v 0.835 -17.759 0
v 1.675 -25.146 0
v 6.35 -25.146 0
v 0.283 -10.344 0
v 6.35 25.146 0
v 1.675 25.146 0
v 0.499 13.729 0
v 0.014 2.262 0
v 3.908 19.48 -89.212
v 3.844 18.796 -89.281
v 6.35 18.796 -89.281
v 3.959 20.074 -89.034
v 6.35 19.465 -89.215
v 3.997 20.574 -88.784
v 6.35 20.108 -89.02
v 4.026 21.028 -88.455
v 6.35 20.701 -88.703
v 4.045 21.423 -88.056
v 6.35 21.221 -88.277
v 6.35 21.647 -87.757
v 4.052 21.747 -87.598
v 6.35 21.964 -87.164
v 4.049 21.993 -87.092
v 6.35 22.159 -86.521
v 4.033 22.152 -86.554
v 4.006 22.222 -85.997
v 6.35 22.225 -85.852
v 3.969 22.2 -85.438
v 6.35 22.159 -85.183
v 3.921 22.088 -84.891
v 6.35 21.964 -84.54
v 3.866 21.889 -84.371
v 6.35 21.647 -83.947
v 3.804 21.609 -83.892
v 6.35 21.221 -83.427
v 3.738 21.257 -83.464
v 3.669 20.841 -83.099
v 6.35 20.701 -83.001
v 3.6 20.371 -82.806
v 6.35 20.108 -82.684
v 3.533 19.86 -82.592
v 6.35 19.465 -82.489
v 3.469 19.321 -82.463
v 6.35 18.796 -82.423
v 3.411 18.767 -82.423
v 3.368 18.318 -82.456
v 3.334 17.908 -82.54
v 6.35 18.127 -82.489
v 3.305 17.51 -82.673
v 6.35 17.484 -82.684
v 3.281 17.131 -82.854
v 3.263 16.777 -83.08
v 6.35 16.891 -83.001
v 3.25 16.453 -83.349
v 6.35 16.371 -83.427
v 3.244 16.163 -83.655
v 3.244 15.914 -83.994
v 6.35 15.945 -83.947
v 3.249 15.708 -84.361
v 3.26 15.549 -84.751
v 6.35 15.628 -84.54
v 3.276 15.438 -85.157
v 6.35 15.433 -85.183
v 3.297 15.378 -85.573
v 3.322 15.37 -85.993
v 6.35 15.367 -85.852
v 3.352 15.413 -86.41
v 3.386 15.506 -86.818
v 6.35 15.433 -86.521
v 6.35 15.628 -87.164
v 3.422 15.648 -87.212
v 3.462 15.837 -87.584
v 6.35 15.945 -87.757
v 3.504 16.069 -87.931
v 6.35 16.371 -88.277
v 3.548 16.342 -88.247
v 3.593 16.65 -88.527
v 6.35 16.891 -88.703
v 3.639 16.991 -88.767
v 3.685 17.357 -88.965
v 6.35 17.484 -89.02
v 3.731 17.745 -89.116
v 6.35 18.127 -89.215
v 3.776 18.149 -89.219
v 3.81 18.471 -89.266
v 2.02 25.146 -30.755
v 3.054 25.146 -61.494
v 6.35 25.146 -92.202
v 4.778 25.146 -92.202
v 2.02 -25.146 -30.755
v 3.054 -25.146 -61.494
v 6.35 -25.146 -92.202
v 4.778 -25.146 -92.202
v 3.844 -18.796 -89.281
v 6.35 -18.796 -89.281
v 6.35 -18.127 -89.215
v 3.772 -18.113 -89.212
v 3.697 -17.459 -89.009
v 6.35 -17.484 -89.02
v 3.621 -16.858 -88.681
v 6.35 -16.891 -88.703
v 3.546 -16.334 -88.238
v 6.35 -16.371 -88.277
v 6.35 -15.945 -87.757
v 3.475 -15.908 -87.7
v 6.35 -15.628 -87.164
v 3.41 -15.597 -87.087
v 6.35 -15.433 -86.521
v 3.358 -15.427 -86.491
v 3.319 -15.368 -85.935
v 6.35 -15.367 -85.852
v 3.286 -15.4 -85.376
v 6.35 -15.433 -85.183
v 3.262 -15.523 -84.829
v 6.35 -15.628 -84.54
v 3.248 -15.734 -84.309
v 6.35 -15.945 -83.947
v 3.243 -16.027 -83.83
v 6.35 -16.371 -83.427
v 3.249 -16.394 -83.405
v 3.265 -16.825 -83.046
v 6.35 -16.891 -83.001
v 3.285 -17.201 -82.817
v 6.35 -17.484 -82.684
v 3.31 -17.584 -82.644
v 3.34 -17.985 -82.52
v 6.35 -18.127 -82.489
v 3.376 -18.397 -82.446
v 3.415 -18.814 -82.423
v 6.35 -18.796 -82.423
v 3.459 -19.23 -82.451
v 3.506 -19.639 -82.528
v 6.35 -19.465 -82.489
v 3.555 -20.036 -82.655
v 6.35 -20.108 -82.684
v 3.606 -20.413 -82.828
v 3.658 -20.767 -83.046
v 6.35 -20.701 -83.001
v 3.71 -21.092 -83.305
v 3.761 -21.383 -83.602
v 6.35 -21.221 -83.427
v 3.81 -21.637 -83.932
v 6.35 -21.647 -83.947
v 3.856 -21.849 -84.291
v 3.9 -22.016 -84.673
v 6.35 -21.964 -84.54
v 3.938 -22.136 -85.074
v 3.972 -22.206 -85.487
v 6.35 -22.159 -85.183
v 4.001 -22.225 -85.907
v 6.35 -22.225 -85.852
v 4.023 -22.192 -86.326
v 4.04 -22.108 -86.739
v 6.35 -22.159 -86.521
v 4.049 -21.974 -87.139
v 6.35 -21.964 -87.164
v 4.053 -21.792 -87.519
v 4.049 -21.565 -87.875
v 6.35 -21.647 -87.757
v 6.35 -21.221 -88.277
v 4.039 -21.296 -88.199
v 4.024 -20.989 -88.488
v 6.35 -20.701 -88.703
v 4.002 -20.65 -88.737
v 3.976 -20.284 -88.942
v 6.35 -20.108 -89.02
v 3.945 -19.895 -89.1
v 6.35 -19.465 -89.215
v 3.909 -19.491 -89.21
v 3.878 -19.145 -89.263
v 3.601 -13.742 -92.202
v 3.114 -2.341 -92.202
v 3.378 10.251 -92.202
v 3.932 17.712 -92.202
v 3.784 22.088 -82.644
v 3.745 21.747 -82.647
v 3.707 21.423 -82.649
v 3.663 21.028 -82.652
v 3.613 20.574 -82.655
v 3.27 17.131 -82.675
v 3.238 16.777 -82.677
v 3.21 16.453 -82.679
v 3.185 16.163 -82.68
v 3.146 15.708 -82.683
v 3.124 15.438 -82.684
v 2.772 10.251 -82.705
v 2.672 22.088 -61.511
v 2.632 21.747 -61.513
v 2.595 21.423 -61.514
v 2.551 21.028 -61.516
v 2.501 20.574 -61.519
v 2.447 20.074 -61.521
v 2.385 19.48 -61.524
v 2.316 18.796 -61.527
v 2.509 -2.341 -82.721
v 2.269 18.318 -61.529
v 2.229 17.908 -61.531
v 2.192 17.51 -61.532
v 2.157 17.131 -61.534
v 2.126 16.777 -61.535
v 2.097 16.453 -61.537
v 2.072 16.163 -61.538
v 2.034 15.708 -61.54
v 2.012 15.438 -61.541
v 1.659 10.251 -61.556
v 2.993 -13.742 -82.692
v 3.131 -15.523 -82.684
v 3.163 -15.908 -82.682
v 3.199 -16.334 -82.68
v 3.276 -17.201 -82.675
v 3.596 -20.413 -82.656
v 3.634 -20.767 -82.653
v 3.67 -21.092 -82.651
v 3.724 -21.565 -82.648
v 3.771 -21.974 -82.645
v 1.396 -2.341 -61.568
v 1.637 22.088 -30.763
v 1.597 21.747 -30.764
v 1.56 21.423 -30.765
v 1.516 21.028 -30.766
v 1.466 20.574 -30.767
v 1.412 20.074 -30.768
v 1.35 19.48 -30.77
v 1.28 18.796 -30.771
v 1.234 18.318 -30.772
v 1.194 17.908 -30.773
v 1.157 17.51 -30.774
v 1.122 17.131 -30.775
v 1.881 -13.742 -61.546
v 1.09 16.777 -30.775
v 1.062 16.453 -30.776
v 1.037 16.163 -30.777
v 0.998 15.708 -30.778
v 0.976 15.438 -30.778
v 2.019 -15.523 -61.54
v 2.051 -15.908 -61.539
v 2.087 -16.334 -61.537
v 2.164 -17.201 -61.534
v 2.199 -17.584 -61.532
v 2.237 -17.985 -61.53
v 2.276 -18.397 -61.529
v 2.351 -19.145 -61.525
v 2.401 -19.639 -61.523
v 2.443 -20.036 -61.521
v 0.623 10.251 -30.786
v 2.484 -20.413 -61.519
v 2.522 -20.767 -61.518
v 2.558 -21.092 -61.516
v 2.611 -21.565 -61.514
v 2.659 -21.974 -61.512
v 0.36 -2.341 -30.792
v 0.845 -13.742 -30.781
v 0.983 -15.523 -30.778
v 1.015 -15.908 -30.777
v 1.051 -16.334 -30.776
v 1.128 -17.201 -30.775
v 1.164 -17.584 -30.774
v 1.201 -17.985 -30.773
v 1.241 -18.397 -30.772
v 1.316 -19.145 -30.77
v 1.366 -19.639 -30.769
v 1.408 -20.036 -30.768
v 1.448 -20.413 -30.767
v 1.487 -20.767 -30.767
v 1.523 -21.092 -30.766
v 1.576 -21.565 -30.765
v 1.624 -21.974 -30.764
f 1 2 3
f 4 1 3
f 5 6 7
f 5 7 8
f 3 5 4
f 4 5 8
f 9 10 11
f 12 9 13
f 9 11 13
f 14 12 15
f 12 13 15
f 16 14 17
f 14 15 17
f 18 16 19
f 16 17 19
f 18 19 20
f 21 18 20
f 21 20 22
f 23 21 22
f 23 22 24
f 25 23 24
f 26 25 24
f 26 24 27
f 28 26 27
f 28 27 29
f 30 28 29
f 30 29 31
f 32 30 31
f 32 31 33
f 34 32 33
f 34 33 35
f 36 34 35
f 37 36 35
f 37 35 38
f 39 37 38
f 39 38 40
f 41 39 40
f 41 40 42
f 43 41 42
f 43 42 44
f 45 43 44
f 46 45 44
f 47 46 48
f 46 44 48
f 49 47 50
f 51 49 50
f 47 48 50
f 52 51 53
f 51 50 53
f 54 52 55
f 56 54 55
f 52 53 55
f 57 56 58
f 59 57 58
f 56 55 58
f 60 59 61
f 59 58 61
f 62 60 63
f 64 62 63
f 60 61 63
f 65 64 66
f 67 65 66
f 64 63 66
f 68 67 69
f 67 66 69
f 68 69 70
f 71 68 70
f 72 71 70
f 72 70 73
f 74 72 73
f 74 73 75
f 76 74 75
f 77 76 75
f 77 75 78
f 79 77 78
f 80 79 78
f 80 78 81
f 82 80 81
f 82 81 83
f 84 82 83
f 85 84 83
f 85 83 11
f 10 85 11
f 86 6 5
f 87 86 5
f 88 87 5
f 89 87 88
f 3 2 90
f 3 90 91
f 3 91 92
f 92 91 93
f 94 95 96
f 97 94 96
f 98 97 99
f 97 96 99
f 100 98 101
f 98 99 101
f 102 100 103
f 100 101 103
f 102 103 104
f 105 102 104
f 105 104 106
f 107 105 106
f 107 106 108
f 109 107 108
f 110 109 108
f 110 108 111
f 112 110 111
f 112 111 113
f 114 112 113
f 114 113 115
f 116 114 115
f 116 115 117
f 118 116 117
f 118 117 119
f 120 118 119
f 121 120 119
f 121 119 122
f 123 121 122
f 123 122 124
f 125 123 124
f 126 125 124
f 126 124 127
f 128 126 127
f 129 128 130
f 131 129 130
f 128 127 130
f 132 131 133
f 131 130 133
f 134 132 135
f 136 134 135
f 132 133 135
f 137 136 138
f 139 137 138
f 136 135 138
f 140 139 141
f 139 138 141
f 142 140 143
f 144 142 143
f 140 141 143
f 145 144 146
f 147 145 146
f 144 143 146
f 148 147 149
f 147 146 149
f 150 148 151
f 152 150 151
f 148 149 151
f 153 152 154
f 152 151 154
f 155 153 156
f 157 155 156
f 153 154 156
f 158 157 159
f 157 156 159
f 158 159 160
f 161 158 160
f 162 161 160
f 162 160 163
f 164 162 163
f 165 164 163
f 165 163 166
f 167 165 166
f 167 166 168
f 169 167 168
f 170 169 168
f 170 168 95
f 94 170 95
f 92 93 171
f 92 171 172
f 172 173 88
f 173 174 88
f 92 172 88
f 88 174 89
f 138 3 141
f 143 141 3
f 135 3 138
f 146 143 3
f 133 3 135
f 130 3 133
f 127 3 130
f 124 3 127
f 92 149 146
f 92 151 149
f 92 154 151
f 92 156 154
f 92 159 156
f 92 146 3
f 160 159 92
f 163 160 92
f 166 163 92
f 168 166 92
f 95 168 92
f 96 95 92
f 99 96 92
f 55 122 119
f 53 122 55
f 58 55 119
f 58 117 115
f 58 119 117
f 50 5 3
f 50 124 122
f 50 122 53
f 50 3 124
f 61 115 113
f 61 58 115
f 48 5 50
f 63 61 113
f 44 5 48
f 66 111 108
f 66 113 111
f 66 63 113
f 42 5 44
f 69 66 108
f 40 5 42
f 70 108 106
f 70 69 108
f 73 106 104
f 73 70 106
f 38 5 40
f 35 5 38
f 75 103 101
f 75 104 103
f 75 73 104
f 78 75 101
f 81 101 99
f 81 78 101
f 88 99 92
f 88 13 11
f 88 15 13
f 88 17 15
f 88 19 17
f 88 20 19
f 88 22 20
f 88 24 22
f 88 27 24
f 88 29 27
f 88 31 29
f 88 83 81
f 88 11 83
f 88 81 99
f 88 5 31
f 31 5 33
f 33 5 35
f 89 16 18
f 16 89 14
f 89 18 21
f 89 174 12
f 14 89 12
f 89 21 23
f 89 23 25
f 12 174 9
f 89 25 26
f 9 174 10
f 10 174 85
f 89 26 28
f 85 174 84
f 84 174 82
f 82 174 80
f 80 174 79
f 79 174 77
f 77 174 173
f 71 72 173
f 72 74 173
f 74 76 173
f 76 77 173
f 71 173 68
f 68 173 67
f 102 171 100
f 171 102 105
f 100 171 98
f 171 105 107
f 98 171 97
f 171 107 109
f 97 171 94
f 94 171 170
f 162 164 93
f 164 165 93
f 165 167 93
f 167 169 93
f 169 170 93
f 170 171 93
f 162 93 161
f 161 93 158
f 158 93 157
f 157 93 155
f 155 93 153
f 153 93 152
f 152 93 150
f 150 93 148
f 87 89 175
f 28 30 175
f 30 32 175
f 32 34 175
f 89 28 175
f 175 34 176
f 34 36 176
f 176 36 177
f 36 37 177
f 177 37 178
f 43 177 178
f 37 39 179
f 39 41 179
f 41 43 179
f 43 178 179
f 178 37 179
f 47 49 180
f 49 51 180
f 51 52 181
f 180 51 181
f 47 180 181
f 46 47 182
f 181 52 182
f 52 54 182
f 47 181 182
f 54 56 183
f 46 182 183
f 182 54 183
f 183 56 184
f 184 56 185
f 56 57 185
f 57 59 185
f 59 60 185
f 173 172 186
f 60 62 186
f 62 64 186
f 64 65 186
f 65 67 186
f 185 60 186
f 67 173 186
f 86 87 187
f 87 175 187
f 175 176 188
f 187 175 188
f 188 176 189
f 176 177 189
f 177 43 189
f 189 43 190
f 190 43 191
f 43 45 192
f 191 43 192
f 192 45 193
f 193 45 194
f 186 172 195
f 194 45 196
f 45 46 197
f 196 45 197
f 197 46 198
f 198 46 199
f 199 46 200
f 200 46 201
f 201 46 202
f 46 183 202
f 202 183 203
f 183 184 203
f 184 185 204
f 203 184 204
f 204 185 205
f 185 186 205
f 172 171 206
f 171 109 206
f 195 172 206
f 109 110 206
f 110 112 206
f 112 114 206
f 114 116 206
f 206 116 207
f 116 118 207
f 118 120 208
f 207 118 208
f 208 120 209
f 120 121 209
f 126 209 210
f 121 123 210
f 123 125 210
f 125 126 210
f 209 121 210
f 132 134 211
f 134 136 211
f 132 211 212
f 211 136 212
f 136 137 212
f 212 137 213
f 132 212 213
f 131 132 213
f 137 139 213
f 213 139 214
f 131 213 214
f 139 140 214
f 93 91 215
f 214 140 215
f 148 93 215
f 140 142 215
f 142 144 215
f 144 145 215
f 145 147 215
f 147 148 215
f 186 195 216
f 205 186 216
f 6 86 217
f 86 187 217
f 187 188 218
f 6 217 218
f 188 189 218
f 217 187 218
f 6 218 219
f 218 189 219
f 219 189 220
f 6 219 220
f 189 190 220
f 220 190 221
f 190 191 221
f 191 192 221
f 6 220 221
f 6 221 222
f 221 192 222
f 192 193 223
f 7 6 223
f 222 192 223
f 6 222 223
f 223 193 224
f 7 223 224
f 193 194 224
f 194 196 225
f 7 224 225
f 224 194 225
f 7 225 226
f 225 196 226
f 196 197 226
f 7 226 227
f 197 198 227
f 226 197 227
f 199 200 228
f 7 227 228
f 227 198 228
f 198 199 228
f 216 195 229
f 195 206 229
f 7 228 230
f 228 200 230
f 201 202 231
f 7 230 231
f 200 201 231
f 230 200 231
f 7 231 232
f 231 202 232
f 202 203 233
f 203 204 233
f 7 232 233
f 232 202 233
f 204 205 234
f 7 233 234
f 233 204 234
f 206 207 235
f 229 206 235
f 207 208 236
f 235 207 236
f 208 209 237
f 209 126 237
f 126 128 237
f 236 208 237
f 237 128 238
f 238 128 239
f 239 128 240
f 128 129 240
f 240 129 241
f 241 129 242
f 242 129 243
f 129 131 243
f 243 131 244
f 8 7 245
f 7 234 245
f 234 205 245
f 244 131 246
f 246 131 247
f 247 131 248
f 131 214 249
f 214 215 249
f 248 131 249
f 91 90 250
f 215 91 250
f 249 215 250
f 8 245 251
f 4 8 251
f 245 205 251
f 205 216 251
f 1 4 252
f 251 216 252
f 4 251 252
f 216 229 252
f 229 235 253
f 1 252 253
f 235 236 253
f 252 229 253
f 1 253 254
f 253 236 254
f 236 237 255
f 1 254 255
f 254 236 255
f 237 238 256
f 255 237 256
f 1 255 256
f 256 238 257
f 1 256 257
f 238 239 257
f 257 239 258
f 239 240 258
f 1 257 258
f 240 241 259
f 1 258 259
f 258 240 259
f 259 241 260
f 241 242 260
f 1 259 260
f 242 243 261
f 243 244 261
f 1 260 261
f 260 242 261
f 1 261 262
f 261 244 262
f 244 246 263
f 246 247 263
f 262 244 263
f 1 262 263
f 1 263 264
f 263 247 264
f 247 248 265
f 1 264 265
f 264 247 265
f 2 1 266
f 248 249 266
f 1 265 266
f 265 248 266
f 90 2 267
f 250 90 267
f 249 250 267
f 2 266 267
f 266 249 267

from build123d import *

# Parameters (mm, degrees)
CUT_EXTRUDE2_DEPTH      = 3112.786644088
CUT_EXTRUDE2_DEPTH_BACK = 3112.786644088
SKETCH2_OUTSIDE_W       = 3550.624
SKETCH2_OUTSIDE_H       = 1823.424
SKETCH2_OUTSIDE_W_2     = 184.404
SKETCH2_OUTSIDE_H_2     = 50.292
CUT_EXTRUDE3_START      = 6.35
SKETCH3_W               = 184.404
SKETCH3_H               = 50.292
CUT_EXTRUDE3_DEPTH      = 2742.052714982
SKETCH4_R               = 3.429
CUT_EXTRUDE4_DEPTH      = 96.78023097
SKETCH5_W               = 69.135430889
SKETCH5_H               = 107.37234518
CUT_EXTRUDE5_DEPTH      = 96.78023097


with BuildPart() as part:
    # Sketch1 → Revolve1 (revolve)
    with BuildSketch(Plane.XY):
        with BuildLine():
            Line((1372.87, -509.27), (1372.87, 509.27))
            add(Edge.make_bspline(
                [(1372.87, 509.27), (0, 509.27), (0, 0), (0, -509.27), (1372.87, -509.27)],
                knots=[4.71238898, 4.71238898, 4.71238898, 6.283185307, 6.283185307, 7.853981634, 7.853981634, 7.853981634], degree=2, weights=[1, 0.707106781, 1, 0.707106781, 1]))
        make_face()
    revolve(axis=Axis((1372.87, -509.27, 0), (0, 1, 0)))

    # Sketch2 outside → Cut-Extrude2 (cut, two sides: drawn at the far end of the back side and taken through both)
    with BuildSketch(Plane(origin=(0, 0, 0), x_dir=(0, 0, -1), z_dir=(1, 0, 0)).offset(-CUT_EXTRUDE2_DEPTH_BACK)):
        Rectangle(SKETCH2_OUTSIDE_W, SKETCH2_OUTSIDE_H)
        Rectangle(SKETCH2_OUTSIDE_W_2, SKETCH2_OUTSIDE_H_2, mode=Mode.SUBTRACT)
    extrude(amount=CUT_EXTRUDE2_DEPTH + CUT_EXTRUDE2_DEPTH_BACK, mode=Mode.SUBTRACT)

    # Sketch3 → Cut-Extrude3 (cut, through all)
    with BuildSketch(Plane(origin=(0, 0, 0), x_dir=(0, 0, -1), z_dir=(1, 0, 0)).offset(CUT_EXTRUDE3_START)):
        Rectangle(SKETCH3_W, SKETCH3_H)
    extrude(amount=CUT_EXTRUDE3_DEPTH, mode=Mode.SUBTRACT)

    # Sketch4 → Cut-Extrude4 (cut, through all)
    with BuildSketch(Plane(origin=(6.35, 0, 0), x_dir=(0, 0, -1), z_dir=(1, 0, 0))):
        with Locations((-85.852, 18.796)):
            Circle(SKETCH4_R)
        with Locations((-85.852, -18.796)):
            Circle(SKETCH4_R)
        with Locations((85.852, -18.796)):
            Circle(SKETCH4_R)
        with Locations((85.852, 18.796)):
            Circle(SKETCH4_R)
    extrude(amount=-CUT_EXTRUDE4_DEPTH, mode=Mode.SUBTRACT)

    # Sketch5 → Cut-Extrude5 (cut, through all)
    with BuildSketch(Plane.XY):
        with Locations((-10.995451772, -25.072858782)):
            Rectangle(SKETCH5_W, SKETCH5_H)
    extrude(amount=CUT_EXTRUDE5_DEPTH, mode=Mode.SUBTRACT)


solid = part.part
